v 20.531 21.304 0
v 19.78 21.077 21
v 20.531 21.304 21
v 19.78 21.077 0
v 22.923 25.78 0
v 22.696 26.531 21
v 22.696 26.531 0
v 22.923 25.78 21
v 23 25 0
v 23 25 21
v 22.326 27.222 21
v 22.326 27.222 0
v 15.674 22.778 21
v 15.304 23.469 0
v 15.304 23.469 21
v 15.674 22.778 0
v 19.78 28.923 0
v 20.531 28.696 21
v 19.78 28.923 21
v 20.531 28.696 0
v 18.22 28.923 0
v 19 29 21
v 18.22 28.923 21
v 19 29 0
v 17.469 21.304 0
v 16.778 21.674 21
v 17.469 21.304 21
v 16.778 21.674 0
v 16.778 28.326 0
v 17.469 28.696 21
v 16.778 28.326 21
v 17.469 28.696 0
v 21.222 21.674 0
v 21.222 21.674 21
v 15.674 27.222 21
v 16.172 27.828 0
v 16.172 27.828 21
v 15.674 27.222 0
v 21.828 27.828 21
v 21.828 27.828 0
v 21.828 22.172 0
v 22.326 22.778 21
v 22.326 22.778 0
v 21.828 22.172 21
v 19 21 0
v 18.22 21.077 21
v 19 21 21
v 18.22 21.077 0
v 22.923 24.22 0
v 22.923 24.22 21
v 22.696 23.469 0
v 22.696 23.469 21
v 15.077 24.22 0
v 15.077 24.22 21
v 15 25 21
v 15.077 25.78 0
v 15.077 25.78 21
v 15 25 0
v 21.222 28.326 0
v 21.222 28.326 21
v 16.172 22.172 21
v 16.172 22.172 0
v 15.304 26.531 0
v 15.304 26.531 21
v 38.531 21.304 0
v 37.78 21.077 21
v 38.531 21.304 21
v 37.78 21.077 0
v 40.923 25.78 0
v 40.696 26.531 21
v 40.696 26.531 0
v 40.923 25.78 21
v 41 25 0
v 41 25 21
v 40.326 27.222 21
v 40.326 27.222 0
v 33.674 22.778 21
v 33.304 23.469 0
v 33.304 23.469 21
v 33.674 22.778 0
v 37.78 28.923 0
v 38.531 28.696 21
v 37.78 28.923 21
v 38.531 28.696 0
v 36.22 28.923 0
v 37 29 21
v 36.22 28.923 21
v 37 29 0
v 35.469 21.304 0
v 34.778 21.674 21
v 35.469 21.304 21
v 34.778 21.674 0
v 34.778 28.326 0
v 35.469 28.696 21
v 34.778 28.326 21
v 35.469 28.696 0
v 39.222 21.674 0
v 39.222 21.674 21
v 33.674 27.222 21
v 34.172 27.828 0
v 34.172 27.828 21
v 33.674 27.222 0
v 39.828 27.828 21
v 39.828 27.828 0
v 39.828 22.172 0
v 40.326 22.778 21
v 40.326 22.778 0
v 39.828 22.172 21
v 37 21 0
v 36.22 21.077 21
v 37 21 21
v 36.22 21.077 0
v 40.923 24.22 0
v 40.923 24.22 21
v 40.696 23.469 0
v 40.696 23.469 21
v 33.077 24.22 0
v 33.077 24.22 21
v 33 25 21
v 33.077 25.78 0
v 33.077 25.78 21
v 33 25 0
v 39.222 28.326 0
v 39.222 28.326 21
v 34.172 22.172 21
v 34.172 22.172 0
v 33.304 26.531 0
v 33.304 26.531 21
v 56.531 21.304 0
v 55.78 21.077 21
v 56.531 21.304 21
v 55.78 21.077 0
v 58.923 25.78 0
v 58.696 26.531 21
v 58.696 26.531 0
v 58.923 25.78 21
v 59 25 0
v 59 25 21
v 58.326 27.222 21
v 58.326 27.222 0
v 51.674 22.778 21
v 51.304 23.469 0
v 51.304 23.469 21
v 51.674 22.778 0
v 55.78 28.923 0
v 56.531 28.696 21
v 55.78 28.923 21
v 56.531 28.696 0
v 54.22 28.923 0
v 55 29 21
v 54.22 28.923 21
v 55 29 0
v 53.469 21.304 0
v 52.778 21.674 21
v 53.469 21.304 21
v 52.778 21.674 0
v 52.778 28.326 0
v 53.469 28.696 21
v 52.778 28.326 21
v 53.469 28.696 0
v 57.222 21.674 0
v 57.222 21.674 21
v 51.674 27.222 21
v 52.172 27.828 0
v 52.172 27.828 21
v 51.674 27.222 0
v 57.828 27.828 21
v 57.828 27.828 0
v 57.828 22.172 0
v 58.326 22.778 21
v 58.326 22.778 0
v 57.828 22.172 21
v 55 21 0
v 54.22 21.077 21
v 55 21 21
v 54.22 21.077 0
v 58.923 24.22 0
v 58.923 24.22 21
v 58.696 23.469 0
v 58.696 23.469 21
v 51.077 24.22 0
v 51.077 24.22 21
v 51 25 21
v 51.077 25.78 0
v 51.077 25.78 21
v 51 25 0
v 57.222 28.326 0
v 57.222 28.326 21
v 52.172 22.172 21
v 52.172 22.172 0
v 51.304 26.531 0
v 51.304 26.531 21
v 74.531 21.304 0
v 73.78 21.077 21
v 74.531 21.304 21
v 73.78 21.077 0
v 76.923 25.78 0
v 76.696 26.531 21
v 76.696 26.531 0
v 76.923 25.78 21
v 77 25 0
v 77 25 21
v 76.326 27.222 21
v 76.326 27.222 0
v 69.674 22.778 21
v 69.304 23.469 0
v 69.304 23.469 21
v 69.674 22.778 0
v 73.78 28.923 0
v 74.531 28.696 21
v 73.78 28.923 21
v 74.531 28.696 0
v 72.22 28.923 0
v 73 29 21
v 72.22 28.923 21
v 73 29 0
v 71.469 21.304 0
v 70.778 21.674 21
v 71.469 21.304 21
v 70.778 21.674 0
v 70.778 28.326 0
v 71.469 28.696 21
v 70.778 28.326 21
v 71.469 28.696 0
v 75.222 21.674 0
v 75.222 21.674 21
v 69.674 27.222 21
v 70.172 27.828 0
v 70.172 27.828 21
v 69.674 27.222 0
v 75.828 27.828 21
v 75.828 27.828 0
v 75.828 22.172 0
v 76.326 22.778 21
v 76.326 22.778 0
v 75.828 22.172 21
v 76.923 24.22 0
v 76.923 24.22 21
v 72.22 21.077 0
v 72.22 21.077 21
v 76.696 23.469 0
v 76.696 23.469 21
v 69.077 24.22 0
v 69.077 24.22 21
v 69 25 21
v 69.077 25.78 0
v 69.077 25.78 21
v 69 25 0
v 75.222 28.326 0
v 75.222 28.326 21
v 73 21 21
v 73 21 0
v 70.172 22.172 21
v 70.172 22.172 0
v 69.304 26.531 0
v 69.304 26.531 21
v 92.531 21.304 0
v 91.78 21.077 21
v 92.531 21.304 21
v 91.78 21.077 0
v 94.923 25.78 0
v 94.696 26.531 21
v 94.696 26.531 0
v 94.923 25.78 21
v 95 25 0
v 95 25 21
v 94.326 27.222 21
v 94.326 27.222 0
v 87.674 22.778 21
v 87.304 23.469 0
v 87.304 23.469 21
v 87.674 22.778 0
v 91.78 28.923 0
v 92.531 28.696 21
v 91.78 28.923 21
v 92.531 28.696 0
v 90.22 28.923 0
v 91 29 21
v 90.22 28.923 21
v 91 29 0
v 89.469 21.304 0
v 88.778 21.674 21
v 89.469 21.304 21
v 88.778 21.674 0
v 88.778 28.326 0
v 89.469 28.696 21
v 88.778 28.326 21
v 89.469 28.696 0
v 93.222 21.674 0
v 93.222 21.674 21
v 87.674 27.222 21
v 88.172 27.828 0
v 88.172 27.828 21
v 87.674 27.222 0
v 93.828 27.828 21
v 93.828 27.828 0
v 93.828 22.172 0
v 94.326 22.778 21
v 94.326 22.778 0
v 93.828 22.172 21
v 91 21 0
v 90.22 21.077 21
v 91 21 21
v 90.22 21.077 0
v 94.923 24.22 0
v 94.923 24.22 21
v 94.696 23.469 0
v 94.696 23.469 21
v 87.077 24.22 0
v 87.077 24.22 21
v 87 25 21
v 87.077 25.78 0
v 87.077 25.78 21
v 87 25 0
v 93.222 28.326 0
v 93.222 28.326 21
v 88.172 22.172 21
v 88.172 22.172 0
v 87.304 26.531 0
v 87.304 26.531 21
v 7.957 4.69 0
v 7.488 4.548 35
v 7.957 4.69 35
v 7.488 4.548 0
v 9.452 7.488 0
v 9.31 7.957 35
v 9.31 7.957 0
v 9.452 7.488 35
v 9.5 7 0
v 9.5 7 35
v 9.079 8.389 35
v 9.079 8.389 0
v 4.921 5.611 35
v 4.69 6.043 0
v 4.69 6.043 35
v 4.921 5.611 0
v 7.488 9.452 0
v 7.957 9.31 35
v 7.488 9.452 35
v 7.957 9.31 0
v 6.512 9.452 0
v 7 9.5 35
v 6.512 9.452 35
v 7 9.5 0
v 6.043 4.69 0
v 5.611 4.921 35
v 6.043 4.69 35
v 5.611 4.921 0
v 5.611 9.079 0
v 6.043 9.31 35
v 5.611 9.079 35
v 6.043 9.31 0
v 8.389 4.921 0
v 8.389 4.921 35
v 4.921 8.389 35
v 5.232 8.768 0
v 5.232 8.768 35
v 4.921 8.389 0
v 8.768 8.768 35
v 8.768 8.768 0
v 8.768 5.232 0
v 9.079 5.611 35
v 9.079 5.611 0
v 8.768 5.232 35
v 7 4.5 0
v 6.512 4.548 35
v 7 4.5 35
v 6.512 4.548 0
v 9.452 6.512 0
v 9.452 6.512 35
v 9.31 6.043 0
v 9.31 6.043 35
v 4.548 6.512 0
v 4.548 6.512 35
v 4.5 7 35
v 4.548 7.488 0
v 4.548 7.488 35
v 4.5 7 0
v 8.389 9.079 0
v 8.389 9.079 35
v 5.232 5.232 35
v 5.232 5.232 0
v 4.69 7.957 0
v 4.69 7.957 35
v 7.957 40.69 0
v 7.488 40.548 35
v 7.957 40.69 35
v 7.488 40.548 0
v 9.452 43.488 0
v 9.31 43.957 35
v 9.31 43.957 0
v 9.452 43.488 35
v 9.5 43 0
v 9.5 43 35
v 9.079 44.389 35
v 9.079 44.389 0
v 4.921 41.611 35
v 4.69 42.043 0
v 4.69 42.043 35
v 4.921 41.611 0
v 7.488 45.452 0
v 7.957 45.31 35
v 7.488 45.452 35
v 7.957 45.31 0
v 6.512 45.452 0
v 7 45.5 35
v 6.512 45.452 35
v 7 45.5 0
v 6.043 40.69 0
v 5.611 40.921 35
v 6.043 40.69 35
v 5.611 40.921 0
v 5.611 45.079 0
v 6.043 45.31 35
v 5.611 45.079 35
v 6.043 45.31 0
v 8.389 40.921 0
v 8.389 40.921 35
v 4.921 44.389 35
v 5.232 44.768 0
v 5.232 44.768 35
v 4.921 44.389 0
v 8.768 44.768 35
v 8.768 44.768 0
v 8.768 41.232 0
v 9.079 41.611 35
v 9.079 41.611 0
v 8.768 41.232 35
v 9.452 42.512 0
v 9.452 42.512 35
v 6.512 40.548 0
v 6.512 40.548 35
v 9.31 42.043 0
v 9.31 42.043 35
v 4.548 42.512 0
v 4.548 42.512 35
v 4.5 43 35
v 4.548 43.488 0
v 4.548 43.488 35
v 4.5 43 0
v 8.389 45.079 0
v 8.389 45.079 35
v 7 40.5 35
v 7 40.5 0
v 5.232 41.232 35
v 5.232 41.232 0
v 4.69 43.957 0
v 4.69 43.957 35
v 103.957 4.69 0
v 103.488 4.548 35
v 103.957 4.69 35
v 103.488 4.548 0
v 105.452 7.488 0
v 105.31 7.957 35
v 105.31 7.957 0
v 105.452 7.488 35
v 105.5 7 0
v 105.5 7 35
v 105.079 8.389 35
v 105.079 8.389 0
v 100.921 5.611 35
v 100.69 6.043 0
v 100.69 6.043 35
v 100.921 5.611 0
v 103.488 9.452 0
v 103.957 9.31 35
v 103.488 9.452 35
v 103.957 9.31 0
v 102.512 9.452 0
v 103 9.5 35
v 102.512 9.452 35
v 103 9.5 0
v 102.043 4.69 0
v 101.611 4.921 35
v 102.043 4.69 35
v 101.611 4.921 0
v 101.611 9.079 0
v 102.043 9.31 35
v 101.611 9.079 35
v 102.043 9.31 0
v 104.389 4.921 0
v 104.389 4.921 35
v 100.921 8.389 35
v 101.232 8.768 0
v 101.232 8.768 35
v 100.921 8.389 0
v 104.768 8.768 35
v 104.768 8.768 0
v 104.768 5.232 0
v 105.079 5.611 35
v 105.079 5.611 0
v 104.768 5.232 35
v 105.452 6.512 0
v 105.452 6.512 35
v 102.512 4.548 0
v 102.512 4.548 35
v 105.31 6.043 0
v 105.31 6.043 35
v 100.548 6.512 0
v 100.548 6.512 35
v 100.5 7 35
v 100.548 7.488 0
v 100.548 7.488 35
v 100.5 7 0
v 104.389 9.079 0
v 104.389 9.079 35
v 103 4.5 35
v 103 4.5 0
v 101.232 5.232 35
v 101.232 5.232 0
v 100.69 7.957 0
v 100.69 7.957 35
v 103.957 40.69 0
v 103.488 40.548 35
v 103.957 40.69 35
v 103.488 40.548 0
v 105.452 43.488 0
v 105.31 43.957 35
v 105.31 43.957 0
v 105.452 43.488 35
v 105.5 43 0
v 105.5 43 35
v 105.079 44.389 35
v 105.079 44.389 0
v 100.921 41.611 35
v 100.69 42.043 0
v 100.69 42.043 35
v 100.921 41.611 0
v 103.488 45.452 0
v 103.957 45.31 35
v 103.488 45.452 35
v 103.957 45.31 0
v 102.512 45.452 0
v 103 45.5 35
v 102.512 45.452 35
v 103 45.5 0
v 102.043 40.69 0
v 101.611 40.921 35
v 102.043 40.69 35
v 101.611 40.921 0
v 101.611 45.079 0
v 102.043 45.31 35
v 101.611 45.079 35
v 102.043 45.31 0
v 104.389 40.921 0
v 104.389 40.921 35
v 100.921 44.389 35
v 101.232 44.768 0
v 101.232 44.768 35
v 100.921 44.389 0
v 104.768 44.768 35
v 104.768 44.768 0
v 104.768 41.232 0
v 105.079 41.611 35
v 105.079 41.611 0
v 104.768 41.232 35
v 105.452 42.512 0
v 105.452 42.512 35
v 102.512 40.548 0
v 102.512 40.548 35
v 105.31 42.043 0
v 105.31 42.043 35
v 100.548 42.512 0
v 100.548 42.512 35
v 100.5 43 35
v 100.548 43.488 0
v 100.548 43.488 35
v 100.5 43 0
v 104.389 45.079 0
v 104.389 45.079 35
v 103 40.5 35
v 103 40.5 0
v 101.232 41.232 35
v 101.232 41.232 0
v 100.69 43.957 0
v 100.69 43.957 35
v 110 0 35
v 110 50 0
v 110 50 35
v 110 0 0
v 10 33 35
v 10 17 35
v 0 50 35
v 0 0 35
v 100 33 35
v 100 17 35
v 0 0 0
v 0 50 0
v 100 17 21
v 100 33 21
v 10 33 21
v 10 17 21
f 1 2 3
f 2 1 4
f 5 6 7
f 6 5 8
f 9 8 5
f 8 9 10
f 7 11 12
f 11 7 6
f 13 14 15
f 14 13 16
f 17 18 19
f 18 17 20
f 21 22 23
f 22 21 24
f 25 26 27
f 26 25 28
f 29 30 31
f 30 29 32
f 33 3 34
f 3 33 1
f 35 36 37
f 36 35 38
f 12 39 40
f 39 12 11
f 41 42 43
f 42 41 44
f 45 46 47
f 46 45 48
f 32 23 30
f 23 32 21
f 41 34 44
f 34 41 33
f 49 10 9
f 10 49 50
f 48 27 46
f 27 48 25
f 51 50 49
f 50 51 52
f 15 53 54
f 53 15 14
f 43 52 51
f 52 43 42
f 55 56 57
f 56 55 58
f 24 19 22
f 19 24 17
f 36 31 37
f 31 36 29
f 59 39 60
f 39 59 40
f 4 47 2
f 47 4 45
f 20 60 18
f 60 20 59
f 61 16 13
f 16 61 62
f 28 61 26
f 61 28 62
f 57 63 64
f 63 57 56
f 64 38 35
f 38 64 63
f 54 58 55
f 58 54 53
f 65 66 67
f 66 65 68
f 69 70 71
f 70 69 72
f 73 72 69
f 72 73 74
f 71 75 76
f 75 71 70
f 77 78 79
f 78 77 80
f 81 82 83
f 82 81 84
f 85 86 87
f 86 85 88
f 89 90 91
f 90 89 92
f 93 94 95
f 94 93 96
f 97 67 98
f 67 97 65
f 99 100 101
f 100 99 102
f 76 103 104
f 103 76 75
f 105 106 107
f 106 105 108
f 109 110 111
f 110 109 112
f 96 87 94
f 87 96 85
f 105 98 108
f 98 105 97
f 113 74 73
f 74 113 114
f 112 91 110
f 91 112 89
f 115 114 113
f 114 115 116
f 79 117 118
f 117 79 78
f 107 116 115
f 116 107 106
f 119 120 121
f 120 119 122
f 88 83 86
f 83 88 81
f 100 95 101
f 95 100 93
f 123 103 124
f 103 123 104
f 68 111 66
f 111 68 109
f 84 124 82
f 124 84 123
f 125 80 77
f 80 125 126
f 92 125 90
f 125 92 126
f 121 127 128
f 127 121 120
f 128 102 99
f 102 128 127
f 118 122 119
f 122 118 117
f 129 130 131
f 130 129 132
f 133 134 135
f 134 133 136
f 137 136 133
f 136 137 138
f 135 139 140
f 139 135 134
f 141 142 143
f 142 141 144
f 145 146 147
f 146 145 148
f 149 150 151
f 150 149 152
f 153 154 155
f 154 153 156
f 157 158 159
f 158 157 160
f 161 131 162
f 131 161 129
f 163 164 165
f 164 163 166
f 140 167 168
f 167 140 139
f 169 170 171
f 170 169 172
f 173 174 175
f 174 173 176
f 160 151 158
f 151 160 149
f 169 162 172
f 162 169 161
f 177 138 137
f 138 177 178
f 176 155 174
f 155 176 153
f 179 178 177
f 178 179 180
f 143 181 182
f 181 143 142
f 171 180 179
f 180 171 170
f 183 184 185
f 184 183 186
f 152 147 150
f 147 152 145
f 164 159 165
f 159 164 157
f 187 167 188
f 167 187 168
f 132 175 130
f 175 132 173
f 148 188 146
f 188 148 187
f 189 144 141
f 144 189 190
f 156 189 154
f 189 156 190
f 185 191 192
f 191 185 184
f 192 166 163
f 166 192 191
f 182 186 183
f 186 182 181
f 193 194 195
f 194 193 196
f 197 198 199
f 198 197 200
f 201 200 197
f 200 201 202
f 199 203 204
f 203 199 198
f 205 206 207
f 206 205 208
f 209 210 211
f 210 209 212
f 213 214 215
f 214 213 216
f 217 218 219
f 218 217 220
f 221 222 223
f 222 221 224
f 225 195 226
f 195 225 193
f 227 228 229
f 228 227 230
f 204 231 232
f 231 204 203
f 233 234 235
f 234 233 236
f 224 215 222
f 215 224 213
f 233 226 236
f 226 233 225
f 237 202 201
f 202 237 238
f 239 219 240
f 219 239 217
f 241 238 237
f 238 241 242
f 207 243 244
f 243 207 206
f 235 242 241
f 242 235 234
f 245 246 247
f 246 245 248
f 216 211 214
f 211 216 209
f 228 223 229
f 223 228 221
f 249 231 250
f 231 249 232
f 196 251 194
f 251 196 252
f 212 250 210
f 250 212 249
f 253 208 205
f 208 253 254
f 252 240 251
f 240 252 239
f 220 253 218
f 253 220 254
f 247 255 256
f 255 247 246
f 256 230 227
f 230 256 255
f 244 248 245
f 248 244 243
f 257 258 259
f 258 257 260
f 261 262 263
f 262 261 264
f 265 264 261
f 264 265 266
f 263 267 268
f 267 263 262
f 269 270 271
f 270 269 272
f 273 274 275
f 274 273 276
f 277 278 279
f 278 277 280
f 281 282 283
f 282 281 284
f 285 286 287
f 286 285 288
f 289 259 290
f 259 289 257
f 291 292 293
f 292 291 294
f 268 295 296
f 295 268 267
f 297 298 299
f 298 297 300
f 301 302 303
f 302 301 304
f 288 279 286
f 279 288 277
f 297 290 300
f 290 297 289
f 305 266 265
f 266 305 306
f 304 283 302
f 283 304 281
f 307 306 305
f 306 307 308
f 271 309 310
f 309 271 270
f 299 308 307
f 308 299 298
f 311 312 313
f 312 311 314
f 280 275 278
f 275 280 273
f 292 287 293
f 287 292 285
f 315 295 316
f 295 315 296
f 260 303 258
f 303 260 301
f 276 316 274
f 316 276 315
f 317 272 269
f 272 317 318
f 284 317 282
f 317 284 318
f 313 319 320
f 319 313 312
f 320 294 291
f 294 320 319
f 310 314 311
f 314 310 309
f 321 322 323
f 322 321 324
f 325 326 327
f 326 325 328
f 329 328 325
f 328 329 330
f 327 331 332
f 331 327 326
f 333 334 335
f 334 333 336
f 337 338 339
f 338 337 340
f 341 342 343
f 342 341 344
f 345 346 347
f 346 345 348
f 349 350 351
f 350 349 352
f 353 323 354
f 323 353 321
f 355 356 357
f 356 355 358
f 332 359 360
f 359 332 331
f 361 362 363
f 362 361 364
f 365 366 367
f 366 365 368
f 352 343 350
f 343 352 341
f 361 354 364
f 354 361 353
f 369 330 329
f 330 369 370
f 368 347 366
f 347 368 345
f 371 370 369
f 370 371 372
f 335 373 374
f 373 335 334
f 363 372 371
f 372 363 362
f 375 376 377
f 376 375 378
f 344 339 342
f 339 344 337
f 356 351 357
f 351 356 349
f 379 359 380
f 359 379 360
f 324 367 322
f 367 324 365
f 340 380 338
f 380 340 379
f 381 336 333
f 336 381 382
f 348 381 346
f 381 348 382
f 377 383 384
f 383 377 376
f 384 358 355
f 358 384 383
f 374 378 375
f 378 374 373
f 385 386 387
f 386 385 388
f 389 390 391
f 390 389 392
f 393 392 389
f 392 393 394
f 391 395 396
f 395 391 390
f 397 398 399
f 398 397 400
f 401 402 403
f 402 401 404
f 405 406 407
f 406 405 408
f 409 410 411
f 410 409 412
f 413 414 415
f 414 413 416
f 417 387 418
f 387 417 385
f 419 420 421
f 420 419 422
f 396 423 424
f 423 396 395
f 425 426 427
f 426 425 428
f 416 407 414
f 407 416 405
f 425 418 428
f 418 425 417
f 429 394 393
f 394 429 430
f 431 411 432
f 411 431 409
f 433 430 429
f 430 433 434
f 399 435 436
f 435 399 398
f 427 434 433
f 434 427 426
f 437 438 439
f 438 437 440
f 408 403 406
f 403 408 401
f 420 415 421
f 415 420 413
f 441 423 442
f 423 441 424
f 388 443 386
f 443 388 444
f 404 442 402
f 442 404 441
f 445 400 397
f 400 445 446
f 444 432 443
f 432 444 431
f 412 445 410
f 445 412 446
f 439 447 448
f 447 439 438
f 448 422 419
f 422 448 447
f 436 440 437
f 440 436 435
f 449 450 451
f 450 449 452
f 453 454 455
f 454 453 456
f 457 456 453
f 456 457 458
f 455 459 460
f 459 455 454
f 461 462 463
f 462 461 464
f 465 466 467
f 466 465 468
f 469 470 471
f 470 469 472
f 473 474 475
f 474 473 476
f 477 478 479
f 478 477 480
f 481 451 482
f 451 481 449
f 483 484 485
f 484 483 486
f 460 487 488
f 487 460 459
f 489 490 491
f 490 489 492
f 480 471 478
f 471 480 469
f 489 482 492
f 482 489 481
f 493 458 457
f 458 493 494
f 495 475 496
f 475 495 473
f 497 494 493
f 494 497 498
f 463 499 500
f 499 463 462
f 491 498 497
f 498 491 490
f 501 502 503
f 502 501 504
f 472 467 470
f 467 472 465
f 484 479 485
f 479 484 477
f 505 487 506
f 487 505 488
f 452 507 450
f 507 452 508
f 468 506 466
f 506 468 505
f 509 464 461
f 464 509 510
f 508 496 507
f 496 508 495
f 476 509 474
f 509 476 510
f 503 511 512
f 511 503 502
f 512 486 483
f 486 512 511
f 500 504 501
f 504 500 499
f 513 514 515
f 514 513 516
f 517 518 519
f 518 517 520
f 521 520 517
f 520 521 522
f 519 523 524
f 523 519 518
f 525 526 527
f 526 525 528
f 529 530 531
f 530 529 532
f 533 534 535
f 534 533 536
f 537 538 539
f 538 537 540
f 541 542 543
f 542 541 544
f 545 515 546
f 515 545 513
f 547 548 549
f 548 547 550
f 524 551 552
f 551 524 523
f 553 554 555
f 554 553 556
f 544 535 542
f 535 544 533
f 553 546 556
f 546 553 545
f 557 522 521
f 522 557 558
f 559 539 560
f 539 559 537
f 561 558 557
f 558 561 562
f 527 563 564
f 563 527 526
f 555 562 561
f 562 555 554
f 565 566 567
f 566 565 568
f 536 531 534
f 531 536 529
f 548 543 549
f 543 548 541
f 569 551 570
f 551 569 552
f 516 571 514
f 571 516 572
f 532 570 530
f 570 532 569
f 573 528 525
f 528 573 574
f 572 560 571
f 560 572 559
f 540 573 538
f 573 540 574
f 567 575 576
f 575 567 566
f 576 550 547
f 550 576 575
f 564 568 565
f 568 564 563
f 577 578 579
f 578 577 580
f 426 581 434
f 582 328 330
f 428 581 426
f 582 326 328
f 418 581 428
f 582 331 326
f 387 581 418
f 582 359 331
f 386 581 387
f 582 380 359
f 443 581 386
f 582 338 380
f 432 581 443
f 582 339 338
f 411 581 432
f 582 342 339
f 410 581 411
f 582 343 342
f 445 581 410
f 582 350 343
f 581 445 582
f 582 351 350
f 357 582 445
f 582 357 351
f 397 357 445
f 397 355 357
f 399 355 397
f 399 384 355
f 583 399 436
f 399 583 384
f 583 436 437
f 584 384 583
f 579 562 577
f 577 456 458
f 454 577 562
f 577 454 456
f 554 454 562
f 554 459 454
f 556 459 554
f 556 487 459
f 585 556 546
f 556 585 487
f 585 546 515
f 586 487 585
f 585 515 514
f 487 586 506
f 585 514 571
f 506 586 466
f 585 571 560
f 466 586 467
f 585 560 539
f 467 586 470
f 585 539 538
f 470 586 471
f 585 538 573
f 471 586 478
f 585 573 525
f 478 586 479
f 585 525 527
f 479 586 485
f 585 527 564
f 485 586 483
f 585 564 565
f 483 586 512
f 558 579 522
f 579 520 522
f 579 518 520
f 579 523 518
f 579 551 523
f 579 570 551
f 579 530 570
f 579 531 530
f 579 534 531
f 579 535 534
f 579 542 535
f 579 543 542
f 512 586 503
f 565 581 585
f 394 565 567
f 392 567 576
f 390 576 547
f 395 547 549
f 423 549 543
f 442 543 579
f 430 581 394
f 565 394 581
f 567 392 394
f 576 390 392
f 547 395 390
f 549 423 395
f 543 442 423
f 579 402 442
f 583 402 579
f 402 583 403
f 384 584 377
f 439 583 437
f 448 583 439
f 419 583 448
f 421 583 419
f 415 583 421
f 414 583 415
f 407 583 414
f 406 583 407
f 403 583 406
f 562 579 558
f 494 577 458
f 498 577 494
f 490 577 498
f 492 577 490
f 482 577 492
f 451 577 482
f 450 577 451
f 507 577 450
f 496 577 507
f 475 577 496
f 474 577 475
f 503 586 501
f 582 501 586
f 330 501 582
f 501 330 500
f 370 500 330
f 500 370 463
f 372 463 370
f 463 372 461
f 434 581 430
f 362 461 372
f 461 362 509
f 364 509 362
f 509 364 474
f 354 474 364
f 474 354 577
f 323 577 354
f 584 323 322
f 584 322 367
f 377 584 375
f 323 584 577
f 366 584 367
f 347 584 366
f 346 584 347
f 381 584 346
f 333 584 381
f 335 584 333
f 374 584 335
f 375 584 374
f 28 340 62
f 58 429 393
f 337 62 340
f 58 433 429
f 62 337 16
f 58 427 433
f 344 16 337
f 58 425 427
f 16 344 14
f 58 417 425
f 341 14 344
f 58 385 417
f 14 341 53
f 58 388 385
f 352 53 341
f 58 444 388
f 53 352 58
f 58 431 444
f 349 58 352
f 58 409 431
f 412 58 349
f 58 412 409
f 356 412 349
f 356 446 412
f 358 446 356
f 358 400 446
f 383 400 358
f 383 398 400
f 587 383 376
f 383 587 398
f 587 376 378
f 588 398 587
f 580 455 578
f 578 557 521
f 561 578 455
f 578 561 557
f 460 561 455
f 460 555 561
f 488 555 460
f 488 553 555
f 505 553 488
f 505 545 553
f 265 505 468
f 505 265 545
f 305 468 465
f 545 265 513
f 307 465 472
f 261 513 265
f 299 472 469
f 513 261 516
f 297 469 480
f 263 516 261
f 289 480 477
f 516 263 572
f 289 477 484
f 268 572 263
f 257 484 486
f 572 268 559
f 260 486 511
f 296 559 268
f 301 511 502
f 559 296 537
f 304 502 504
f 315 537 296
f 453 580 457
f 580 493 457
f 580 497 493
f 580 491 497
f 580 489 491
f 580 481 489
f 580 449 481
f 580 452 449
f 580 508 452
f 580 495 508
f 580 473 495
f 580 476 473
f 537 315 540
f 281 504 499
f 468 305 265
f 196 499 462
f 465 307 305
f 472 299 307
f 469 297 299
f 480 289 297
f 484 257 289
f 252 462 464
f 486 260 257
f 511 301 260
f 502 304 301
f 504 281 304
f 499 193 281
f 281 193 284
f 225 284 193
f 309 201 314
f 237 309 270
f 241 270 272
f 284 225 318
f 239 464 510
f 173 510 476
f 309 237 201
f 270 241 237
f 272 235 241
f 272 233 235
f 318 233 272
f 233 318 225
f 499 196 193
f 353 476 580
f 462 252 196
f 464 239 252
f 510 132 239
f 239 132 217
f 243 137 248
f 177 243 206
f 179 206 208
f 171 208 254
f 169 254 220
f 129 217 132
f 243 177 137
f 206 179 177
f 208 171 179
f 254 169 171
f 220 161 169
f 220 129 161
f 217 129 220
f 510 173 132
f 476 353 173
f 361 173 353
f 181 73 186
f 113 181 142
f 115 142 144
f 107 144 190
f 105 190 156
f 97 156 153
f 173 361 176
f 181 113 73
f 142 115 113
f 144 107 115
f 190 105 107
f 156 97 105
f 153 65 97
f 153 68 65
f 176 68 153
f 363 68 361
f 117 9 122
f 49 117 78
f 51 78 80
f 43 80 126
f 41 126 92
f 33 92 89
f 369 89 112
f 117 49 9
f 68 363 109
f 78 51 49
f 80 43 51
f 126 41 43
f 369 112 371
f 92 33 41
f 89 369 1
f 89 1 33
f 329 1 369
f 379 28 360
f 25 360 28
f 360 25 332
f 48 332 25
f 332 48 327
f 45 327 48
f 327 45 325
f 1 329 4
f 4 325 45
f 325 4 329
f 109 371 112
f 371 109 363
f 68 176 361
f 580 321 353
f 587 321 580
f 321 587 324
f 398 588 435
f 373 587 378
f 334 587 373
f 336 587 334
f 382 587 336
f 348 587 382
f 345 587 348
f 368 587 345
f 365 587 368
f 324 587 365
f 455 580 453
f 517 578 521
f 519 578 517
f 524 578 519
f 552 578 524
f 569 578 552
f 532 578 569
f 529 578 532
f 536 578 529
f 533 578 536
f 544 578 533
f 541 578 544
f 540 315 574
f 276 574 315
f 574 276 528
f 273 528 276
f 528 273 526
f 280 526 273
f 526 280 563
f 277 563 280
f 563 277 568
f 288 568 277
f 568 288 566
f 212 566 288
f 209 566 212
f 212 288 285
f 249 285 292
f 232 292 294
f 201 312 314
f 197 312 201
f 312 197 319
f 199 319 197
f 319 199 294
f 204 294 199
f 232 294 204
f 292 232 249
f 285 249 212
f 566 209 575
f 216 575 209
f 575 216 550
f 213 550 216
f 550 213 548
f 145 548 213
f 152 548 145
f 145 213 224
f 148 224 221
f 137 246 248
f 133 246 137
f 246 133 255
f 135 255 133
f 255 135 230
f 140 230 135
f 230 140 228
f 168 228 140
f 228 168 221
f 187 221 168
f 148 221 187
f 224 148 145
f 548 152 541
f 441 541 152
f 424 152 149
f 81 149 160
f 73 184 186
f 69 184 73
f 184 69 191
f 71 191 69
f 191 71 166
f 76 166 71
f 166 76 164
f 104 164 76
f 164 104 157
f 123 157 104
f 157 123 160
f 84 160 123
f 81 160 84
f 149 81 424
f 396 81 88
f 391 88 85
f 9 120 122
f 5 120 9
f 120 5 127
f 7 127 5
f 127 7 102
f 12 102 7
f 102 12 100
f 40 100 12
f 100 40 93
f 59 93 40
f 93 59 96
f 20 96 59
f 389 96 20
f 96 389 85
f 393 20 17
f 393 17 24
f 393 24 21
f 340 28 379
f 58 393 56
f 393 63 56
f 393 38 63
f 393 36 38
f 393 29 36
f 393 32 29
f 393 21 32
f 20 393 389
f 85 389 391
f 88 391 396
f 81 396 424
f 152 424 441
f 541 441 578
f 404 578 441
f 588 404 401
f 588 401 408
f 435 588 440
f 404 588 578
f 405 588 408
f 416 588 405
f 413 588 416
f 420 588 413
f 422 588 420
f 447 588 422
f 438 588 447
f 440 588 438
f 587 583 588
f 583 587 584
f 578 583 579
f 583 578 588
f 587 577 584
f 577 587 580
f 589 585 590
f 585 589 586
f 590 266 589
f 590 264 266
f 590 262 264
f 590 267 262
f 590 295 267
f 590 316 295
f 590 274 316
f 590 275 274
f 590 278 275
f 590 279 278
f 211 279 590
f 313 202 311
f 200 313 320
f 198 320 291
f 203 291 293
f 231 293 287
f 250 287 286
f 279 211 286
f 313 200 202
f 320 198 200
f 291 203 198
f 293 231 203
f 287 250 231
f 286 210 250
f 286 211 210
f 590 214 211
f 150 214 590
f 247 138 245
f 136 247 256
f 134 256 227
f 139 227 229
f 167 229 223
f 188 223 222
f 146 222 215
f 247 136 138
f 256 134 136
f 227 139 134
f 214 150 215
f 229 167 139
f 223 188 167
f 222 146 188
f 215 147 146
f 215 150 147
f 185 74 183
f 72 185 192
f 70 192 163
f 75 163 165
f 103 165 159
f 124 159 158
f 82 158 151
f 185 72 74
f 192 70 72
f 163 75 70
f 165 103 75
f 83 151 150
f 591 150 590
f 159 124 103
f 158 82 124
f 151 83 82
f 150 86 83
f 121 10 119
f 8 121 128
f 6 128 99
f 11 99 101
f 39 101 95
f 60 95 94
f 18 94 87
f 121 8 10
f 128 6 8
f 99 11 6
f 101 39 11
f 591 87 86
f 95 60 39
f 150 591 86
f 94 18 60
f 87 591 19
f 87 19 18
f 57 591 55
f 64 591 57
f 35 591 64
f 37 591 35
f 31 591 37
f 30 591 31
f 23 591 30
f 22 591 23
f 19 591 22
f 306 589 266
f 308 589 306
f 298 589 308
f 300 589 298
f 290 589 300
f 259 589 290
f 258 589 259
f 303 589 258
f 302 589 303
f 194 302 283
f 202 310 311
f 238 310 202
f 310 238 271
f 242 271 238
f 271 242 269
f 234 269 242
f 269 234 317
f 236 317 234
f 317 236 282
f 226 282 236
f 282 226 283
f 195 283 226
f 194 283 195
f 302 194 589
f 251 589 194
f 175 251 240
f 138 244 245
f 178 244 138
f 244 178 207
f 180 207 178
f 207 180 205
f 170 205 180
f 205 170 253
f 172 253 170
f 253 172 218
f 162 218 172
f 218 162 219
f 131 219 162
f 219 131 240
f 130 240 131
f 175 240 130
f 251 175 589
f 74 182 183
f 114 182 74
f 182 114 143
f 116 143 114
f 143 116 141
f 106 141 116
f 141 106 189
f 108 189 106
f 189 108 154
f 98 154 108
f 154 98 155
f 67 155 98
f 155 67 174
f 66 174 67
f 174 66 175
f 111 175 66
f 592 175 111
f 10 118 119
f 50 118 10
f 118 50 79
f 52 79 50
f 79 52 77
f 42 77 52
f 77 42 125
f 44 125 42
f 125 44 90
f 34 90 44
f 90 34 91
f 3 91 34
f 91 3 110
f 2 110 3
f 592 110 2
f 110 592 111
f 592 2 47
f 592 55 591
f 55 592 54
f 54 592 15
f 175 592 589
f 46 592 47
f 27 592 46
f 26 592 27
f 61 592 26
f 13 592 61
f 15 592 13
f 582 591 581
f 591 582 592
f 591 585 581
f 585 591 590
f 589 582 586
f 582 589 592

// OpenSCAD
$fn = 32;

// ----------------------------------------------------------------------
// Manifold block: gallery_top manifold
// ----------------------------------------------------------------------

// --- parameters (mm) ---
block_l = 110;            // block length, X
block_w = 50;             // block width, Y
block_h = 35;             // block height, Z
port_d = 8;               // port bore diameter
port_pitch = 18;          // port pitch along X
gallery_d = 16;           // top gallery width, Y
gallery_depth = 14;       // gallery pocket depth
wall_p = 10;              // gallery end wall thickness, X
mnt_d = 5;                // mounting hole diameter
mnt_in = 7;               // mounting hole inset from the edges

n_ports = 5;  // ports in the row
port_x0 = (block_l - (n_ports - 1) * port_pitch) / 2;  // first port X

difference() {
  cube([block_l, block_w, block_h]);
  for (i = [0 : n_ports - 1])
    translate([port_x0 + i * port_pitch, block_w / 2, -1])
      cylinder(h = block_h + 2, d = port_d);
  translate([wall_p, block_w / 2 - gallery_d / 2, block_h - gallery_depth])
    cube([block_l - 2 * wall_p, gallery_d, gallery_depth + 1]);
  for (cx = [mnt_in, block_l - mnt_in])
    for (cy = [mnt_in, block_w - mnt_in])
      translate([cx, cy, -1]) cylinder(h = block_h + 2, d = mnt_d);
}
